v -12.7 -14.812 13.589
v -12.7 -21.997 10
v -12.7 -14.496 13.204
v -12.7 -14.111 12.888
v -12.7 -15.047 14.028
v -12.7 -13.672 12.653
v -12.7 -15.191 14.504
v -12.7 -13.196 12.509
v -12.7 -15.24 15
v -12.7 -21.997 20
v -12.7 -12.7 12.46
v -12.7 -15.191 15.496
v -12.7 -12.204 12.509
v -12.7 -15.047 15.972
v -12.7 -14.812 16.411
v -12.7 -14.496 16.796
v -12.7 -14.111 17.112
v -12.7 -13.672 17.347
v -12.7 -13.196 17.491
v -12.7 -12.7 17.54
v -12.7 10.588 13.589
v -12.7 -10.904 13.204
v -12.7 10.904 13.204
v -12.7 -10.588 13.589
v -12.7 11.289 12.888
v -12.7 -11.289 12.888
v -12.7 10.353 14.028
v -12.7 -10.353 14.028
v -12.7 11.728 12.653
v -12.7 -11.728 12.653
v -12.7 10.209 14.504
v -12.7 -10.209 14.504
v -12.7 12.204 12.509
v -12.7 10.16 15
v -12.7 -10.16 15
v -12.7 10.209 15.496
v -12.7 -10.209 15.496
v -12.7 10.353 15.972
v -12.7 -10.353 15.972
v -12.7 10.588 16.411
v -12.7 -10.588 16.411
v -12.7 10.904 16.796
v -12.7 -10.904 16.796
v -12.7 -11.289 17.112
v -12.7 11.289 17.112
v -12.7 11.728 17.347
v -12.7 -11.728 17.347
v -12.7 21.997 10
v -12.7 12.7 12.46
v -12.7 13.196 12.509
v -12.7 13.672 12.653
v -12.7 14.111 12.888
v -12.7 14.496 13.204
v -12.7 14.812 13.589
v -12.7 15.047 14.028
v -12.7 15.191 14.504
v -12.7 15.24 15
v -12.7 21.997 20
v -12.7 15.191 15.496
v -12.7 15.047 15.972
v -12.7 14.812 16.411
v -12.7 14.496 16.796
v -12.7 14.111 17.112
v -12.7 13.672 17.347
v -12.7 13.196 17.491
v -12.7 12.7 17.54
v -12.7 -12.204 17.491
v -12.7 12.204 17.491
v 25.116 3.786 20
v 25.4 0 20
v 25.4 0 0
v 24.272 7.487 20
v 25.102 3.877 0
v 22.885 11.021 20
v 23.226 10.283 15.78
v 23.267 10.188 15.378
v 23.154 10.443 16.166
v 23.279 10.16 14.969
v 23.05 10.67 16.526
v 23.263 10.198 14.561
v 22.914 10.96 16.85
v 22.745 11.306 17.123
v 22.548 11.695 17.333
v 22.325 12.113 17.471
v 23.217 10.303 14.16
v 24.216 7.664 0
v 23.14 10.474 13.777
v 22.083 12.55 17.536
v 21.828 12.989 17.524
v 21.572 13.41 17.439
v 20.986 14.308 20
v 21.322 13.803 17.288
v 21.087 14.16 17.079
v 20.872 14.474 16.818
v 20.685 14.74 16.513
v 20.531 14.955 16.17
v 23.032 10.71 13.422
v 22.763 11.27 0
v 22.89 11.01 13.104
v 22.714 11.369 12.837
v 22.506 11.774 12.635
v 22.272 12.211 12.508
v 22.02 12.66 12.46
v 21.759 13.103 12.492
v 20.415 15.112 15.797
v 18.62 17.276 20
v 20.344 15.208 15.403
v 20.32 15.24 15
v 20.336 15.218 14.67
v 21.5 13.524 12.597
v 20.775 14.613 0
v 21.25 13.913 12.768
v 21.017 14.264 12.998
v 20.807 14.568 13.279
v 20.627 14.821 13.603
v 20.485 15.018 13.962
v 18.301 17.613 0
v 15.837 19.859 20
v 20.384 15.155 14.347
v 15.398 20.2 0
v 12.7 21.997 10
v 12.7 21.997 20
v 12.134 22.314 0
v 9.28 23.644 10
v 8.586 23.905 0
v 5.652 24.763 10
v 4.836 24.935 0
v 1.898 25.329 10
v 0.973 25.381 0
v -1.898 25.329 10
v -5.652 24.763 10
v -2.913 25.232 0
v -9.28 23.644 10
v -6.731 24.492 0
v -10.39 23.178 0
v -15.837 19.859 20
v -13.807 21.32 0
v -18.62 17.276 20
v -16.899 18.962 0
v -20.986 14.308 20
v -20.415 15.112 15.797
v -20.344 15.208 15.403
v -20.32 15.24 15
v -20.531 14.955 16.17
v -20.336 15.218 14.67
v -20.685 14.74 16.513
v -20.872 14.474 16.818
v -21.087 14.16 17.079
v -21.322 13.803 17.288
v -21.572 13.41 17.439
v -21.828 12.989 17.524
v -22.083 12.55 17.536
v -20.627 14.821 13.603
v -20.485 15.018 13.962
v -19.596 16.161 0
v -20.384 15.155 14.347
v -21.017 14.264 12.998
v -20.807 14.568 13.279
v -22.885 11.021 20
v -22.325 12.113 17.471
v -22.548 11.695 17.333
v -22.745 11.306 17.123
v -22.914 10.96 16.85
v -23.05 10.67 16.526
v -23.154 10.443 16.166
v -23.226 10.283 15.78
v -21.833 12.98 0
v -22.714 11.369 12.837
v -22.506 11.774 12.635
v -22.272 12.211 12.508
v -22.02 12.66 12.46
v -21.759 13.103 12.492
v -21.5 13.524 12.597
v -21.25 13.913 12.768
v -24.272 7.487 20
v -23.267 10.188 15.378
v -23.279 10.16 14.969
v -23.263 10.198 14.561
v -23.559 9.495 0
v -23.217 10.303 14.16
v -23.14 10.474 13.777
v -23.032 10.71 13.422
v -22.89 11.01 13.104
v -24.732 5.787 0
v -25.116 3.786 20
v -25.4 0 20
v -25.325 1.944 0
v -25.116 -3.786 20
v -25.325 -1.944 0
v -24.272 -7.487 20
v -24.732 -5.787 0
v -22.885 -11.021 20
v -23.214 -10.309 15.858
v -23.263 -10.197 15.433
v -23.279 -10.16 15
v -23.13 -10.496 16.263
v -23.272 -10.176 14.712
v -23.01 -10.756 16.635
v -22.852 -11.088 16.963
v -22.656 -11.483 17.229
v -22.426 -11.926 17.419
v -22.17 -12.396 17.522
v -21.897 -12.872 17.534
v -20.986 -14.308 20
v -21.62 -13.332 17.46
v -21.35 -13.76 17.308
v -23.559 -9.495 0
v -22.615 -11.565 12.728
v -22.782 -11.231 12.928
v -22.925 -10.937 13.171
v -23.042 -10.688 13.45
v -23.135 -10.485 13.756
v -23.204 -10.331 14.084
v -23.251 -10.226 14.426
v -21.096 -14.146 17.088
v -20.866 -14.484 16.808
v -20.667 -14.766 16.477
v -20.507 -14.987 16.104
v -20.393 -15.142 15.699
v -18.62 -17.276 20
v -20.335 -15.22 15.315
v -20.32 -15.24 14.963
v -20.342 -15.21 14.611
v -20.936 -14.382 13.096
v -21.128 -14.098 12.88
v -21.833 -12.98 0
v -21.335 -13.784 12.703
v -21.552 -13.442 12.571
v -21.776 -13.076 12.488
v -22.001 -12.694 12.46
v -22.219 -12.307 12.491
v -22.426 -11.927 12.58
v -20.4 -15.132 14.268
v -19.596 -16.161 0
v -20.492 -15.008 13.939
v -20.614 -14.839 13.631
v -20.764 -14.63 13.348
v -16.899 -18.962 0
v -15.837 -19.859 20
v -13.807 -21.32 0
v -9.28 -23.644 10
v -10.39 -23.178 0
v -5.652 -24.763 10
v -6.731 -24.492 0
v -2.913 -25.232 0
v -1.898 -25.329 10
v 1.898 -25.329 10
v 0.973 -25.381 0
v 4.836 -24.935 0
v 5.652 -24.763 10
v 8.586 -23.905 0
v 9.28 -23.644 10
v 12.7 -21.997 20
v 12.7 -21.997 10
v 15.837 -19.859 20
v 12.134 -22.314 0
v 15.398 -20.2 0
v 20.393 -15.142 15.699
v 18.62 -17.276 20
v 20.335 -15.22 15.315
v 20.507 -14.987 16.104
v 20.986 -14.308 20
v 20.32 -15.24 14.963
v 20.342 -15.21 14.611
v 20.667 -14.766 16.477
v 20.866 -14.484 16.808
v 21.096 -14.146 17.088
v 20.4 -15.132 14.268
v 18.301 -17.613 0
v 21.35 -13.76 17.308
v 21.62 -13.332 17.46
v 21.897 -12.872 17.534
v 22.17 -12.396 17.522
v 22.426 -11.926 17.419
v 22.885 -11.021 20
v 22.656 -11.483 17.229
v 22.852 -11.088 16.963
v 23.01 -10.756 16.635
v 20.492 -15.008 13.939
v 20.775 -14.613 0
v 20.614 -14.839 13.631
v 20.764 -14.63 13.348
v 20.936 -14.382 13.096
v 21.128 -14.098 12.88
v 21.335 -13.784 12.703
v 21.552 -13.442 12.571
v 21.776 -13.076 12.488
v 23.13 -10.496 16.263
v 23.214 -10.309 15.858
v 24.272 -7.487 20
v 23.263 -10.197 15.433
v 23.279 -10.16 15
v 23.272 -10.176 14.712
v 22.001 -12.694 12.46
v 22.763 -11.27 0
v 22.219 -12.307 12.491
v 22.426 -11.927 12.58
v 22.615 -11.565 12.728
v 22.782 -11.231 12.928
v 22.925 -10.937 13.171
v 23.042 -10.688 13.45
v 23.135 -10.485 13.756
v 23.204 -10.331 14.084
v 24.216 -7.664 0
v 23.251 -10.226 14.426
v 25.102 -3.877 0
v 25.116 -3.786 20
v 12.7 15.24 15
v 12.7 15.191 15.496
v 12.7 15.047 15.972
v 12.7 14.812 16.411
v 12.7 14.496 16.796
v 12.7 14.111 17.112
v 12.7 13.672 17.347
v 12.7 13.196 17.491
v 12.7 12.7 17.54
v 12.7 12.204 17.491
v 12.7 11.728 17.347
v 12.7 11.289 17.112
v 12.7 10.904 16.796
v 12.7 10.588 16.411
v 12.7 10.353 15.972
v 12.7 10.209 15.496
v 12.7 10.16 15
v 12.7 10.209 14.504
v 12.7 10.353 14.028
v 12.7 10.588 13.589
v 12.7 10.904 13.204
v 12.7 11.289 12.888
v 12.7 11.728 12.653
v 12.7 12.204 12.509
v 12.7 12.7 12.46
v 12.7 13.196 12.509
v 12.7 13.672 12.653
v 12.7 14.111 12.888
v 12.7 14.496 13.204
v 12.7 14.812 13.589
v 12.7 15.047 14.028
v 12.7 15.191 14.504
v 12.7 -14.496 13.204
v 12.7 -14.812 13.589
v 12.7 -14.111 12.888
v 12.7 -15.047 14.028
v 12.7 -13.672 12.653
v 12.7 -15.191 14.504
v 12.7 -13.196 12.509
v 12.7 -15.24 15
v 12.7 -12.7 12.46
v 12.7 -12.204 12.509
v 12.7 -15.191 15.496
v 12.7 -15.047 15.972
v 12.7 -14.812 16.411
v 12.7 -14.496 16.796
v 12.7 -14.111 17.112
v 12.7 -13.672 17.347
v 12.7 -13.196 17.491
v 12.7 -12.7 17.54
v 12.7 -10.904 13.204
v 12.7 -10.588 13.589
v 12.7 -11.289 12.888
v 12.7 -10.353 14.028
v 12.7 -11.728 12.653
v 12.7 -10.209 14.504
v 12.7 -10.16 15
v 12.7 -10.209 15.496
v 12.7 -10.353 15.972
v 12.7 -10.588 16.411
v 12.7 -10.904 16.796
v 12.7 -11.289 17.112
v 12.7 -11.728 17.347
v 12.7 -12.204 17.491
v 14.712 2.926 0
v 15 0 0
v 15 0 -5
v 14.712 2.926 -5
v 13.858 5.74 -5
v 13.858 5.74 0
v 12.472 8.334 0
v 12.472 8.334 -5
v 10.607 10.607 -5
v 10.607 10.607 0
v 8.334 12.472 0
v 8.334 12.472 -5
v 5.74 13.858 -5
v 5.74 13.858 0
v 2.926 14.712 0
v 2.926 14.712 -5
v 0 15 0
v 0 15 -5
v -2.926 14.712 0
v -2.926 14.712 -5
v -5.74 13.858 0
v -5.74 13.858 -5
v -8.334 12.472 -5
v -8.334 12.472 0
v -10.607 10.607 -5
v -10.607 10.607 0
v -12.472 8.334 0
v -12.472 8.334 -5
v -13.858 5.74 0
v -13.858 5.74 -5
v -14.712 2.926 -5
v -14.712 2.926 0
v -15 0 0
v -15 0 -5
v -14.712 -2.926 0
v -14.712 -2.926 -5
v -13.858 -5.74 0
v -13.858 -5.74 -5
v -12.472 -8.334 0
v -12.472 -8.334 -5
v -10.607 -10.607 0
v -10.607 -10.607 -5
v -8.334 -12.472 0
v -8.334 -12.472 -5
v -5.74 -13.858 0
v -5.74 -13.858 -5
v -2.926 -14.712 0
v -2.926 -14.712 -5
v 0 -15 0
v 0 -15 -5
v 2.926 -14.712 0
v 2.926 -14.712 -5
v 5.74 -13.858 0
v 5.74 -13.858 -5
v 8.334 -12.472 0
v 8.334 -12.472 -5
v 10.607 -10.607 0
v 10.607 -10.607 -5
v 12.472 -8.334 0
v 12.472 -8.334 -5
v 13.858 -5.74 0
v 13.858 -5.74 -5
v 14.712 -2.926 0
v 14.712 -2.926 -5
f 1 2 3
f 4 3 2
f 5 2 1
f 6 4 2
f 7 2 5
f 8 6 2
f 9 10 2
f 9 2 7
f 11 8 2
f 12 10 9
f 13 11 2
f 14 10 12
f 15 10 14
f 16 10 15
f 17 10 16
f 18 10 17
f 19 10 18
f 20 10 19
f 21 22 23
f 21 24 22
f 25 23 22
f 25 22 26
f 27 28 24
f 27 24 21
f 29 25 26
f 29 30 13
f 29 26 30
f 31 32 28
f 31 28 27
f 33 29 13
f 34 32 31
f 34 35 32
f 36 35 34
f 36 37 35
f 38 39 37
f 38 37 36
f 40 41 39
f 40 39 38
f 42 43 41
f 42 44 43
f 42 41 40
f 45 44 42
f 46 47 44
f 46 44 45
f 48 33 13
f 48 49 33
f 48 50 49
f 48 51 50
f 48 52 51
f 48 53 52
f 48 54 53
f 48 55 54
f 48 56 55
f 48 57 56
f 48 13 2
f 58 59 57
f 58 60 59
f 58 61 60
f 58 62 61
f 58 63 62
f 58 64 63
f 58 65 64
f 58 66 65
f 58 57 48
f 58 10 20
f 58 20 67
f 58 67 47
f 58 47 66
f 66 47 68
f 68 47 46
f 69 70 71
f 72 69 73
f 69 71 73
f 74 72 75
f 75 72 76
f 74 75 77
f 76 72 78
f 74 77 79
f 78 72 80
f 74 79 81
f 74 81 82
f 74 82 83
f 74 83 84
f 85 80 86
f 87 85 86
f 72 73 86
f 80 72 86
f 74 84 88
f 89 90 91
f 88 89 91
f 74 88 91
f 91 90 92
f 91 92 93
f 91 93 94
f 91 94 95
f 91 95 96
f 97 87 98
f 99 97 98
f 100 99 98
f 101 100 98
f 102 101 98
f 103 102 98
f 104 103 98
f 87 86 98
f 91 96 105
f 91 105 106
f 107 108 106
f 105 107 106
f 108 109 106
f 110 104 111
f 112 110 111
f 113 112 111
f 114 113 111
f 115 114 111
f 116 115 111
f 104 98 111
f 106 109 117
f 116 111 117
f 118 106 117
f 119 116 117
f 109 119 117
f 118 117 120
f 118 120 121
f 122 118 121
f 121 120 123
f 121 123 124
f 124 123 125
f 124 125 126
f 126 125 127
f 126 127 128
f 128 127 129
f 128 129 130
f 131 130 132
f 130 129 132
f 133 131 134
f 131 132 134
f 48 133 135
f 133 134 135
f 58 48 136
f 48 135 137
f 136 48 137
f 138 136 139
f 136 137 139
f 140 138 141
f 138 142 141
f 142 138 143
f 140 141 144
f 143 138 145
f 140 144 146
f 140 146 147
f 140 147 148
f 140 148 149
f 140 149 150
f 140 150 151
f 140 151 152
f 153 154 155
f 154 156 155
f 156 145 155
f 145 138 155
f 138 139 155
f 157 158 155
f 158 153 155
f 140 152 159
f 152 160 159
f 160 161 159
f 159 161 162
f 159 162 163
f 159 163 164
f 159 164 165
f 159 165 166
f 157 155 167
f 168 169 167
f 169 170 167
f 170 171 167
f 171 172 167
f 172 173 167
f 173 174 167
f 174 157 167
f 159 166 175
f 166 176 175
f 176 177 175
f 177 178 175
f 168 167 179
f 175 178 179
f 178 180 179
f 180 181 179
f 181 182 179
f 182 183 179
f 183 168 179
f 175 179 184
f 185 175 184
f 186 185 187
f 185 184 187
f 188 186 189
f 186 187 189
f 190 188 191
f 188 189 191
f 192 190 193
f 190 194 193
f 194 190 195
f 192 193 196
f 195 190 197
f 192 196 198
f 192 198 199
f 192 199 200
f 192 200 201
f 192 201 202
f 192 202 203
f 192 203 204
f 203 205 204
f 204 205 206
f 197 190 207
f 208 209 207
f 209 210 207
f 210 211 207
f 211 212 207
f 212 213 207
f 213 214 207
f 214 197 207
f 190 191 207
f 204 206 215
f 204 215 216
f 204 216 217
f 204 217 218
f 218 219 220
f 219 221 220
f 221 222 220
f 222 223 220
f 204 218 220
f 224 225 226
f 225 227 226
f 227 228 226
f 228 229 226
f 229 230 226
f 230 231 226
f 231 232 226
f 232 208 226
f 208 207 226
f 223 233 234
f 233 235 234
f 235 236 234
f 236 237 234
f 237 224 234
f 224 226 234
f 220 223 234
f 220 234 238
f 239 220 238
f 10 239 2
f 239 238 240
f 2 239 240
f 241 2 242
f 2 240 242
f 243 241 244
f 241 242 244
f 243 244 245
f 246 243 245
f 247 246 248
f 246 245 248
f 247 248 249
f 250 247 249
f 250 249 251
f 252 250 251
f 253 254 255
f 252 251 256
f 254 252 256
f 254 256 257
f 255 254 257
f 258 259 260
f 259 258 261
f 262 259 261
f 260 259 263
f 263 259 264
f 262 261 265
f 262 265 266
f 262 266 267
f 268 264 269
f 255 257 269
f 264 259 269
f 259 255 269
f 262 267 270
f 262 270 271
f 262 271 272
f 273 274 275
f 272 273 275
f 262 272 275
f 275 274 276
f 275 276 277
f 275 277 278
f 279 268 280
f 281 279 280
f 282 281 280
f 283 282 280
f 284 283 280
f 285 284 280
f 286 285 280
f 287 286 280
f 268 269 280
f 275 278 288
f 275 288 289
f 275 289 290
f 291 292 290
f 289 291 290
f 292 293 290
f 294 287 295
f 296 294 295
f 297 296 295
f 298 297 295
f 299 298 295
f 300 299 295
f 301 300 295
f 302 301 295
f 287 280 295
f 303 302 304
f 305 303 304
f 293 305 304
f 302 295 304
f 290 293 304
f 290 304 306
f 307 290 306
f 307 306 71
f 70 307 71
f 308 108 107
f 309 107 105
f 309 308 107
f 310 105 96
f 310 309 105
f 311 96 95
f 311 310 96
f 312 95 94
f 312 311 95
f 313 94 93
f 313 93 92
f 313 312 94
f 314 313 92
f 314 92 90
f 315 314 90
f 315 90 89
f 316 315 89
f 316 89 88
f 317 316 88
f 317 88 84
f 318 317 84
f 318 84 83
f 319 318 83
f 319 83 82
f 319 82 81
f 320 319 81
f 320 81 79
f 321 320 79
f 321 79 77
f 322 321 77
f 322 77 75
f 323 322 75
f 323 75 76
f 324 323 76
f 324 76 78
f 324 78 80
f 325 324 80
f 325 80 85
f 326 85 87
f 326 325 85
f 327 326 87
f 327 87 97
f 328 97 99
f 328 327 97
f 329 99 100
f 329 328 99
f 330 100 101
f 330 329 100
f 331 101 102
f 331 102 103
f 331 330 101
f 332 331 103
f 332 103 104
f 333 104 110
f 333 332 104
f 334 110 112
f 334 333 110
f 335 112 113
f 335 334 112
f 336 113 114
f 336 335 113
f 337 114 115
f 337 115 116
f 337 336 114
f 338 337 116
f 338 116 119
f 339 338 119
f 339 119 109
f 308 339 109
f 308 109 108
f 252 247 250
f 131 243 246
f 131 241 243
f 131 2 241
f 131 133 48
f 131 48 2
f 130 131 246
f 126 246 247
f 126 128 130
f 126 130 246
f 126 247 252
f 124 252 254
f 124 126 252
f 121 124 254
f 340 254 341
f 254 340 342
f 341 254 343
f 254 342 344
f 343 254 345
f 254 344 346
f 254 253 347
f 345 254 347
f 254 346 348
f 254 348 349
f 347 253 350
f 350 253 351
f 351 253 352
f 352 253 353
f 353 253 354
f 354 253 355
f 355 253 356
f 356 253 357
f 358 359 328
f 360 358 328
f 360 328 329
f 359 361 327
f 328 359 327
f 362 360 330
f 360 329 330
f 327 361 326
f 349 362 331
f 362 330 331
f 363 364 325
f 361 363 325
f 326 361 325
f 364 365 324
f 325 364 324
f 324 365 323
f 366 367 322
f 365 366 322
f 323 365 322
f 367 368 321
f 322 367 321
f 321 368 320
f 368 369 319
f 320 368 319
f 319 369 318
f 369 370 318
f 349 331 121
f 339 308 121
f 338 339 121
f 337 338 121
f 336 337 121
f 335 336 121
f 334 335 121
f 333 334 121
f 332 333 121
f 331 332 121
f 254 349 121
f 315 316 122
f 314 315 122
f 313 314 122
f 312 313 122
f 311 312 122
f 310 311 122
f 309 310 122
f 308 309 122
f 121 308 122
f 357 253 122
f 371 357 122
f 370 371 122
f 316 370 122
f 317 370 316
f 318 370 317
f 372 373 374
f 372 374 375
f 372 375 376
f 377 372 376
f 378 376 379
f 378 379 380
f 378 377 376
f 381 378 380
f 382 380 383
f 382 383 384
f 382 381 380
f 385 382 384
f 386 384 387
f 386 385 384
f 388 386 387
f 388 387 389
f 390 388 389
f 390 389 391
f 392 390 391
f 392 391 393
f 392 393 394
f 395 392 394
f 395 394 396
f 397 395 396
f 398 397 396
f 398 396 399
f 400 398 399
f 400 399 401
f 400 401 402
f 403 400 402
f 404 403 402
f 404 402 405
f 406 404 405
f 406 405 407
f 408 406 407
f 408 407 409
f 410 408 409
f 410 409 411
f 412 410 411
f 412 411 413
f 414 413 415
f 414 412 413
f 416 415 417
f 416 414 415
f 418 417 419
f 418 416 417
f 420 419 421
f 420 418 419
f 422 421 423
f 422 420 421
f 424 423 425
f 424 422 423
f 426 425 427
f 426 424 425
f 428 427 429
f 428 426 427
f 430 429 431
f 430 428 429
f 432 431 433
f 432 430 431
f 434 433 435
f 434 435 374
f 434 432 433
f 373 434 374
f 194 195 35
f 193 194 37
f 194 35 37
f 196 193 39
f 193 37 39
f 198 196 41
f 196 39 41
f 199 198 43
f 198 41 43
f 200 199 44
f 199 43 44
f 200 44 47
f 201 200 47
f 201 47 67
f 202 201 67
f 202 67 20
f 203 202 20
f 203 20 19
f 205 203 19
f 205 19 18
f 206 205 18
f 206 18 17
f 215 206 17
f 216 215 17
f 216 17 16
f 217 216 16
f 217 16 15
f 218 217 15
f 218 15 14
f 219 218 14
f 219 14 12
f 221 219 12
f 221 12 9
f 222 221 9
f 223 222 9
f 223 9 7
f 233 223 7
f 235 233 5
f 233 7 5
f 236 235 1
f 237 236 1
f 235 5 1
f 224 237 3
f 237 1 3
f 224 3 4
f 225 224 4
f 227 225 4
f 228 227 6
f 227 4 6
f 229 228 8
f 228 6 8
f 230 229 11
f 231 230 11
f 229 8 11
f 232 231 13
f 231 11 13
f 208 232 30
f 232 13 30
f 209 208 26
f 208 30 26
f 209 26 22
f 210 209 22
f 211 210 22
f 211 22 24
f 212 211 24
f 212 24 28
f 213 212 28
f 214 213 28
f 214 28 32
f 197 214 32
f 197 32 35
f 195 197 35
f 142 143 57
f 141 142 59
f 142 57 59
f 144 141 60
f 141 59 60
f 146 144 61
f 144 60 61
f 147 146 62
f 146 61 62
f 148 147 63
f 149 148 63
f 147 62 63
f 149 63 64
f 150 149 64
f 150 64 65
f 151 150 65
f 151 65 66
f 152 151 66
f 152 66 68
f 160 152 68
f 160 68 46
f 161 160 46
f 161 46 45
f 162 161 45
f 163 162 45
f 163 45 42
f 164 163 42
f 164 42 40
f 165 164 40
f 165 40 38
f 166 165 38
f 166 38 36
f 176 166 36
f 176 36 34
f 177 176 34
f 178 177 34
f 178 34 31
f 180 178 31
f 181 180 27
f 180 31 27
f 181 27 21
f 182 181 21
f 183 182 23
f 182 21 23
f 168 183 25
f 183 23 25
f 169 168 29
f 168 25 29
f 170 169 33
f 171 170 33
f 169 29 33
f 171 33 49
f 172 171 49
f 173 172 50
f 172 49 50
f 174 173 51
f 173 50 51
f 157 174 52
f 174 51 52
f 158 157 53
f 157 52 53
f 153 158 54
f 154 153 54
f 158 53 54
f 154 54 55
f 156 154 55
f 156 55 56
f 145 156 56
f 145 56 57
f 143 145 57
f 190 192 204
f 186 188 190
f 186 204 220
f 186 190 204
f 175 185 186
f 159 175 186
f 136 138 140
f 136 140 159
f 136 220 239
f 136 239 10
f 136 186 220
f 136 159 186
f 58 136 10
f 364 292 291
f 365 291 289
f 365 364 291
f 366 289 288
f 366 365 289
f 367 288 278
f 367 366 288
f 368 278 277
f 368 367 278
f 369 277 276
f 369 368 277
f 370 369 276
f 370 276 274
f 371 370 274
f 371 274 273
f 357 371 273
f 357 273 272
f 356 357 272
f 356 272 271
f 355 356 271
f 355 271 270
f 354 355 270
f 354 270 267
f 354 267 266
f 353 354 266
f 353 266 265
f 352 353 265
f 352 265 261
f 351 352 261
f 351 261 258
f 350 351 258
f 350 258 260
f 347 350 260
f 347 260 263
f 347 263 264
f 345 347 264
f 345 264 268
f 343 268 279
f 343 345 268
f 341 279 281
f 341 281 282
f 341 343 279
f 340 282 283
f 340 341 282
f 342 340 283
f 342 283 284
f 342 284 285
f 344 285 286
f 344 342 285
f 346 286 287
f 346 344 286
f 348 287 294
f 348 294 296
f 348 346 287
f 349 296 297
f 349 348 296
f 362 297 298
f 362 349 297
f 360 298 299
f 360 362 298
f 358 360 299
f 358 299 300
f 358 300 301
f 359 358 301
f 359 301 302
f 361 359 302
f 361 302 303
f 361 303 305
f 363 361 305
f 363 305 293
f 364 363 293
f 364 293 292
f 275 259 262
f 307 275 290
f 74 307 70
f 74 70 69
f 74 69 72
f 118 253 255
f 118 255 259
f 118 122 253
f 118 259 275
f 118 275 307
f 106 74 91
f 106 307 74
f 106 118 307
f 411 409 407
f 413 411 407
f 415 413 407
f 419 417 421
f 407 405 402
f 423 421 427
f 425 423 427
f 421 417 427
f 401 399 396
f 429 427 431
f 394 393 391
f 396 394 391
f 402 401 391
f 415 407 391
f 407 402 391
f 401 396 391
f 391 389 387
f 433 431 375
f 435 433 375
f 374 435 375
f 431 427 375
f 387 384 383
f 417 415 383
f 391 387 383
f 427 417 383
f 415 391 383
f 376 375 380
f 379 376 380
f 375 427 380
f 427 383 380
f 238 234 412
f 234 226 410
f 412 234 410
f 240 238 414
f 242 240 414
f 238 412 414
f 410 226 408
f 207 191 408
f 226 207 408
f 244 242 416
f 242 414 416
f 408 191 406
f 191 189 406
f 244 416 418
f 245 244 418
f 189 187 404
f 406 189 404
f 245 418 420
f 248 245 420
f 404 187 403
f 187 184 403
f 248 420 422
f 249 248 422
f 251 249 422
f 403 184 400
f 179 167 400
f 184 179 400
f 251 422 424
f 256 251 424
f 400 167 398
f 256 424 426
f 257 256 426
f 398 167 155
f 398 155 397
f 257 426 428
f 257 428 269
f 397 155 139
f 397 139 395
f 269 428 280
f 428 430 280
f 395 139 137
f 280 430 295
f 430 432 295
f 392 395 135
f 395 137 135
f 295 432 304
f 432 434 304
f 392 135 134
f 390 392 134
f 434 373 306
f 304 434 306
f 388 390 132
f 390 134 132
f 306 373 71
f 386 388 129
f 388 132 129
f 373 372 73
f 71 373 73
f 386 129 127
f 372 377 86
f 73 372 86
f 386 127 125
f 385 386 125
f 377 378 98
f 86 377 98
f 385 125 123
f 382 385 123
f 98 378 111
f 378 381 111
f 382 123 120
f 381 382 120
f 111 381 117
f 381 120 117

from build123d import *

# Parameters (mm, degrees)
F0_R          = 25.4
F1_DEPTH      = 20
F2_W          = 25.4
F2_H          = 55.2173810765
F3_DEPTH      = 10
F4_R          = 2.54
F5_DEPTH      = 25.4
F5_DEPTH_BACK = 25.4
F6_R          = 15
F7_DEPTH      = 15


with BuildPart() as f1:
    # F0 (on Top) → F1 (new body)
    with BuildSketch(Plane.XY):
        Circle(F0_R)
    extrude(amount=F1_DEPTH)

    # F2 (on face) → F3 (cut)
    with BuildSketch(Plane.XY.offset(20)):
        with Locations((0, -0.6558205932)):
            Rectangle(F2_W, F2_H)
    extrude(amount=-F3_DEPTH, mode=Mode.SUBTRACT)

    # F4 (on Right) → F5 (cut, two sides)
    with BuildSketch(Plane.YZ) as f5_sk:
        with Locations((-12.7, 15)):
            Circle(F4_R)
        with Locations((12.7, 15)):
            Circle(F4_R)
    extrude(amount=-F5_DEPTH, mode=Mode.SUBTRACT)
    extrude(f5_sk.sketch, amount=F5_DEPTH_BACK, mode=Mode.SUBTRACT)

    # F6 (on face) → F7 (join)
    with BuildSketch(Plane.XY.offset(10)):
        Circle(F6_R)
    extrude(amount=-F7_DEPTH)


solid = f1.part
